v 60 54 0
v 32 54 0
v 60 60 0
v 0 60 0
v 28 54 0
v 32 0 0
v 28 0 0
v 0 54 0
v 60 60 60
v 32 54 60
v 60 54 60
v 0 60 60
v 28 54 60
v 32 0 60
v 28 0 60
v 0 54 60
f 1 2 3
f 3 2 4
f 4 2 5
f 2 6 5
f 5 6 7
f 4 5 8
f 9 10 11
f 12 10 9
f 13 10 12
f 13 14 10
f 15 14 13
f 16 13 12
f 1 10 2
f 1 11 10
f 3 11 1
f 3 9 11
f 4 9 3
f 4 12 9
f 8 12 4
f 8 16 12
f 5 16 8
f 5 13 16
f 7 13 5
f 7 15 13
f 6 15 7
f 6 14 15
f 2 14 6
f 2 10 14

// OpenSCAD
$fn = 32;

// ----------------------------------------------------------------------
// Structural section: tee 60 x 60 mm
// ----------------------------------------------------------------------

// --- parameters (mm) ---
sec_w = 60;               // tee width, X
sec_h = 60;               // tee height, Y
flange_t = 6;             // top flange thickness
web_t = 4;                // web thickness
plate_t = 60;             // cut length, Z (extrusion height)

profile = [[28, 0], [32, 0], [32, 54], [60, 54], [60, 60], [0, 60], [0, 54], [28, 54]];  // primary outline, 8 points, counter clockwise

// --- the one profile operation ---
linear_extrude(height = plate_t) polygon(points = profile);
